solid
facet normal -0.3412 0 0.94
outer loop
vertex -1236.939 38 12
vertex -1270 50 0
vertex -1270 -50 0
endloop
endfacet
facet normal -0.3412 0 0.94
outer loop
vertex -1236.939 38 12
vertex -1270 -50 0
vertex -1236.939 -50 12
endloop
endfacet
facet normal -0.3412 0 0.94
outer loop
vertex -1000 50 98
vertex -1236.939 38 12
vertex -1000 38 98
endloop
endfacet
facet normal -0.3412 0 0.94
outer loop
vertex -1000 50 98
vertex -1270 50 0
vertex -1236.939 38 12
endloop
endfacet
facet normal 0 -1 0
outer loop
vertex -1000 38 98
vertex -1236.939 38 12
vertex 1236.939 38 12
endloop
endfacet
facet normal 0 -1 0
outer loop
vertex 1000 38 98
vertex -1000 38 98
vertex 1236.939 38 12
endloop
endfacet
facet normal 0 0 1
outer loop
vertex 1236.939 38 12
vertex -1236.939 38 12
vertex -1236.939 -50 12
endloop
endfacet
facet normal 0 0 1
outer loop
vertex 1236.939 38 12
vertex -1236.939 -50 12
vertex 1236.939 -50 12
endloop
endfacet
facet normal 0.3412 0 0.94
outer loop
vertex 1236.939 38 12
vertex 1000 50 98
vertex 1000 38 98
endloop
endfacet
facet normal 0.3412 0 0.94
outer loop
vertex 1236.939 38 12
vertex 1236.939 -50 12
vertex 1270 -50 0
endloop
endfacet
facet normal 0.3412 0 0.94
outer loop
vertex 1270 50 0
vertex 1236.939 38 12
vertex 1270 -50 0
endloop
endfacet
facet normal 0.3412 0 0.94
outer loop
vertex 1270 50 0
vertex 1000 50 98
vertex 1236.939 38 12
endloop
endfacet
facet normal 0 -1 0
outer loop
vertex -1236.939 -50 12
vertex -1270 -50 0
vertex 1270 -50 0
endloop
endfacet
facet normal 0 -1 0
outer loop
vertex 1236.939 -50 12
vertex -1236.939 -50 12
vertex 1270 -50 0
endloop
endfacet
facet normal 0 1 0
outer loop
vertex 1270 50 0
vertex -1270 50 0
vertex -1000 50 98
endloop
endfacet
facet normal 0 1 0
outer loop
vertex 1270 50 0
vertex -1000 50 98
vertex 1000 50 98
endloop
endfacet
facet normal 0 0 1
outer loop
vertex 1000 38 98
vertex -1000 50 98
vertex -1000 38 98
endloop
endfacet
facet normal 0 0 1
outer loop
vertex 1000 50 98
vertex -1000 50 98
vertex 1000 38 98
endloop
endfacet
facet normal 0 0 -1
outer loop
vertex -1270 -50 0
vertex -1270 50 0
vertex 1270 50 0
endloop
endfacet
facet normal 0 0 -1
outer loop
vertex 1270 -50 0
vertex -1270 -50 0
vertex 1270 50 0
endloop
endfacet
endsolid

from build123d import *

# Parameters (mm, degrees)
SKETCH_1_W          = 2540
SKETCH_1_H          = 100
EXTRUDE_453_DEPTH   = 12
SKETCH_2_W          = 2540
SKETCH_2_H          = 12
EXTRUDE_1_DEPTH     = 86
CUT_EXTRUDE_1_DEPTH = 1278.694799238


with BuildPart() as part:
    # 草图1 → Extrude 453 (new body)
    with BuildSketch(Plane.XY):
        Rectangle(SKETCH_1_W, SKETCH_1_H)
    extrude(amount=EXTRUDE_453_DEPTH)

    # 草图2 → 凸台-拉伸1 (add)
    with BuildSketch(Plane.XY.offset(12)):
        with Locations((0, 44)):
            Rectangle(SKETCH_2_W, SKETCH_2_H)
    extrude(amount=EXTRUDE_1_DEPTH)

    # 草图4 → 切除-拉伸1 (cut, through all)
    with BuildSketch(Plane(origin=(0, 50, 0), x_dir=(-1, 0, 0), z_dir=(0, 1, 0))):
        Polygon((-1270, 0), (-1270, 98), (-1000, 98), align=None)
        Polygon((1270, 0), (1000, 98), (1270, 98), align=None)
    extrude(amount=-CUT_EXTRUDE_1_DEPTH, mode=Mode.SUBTRACT)


solid = part.part
